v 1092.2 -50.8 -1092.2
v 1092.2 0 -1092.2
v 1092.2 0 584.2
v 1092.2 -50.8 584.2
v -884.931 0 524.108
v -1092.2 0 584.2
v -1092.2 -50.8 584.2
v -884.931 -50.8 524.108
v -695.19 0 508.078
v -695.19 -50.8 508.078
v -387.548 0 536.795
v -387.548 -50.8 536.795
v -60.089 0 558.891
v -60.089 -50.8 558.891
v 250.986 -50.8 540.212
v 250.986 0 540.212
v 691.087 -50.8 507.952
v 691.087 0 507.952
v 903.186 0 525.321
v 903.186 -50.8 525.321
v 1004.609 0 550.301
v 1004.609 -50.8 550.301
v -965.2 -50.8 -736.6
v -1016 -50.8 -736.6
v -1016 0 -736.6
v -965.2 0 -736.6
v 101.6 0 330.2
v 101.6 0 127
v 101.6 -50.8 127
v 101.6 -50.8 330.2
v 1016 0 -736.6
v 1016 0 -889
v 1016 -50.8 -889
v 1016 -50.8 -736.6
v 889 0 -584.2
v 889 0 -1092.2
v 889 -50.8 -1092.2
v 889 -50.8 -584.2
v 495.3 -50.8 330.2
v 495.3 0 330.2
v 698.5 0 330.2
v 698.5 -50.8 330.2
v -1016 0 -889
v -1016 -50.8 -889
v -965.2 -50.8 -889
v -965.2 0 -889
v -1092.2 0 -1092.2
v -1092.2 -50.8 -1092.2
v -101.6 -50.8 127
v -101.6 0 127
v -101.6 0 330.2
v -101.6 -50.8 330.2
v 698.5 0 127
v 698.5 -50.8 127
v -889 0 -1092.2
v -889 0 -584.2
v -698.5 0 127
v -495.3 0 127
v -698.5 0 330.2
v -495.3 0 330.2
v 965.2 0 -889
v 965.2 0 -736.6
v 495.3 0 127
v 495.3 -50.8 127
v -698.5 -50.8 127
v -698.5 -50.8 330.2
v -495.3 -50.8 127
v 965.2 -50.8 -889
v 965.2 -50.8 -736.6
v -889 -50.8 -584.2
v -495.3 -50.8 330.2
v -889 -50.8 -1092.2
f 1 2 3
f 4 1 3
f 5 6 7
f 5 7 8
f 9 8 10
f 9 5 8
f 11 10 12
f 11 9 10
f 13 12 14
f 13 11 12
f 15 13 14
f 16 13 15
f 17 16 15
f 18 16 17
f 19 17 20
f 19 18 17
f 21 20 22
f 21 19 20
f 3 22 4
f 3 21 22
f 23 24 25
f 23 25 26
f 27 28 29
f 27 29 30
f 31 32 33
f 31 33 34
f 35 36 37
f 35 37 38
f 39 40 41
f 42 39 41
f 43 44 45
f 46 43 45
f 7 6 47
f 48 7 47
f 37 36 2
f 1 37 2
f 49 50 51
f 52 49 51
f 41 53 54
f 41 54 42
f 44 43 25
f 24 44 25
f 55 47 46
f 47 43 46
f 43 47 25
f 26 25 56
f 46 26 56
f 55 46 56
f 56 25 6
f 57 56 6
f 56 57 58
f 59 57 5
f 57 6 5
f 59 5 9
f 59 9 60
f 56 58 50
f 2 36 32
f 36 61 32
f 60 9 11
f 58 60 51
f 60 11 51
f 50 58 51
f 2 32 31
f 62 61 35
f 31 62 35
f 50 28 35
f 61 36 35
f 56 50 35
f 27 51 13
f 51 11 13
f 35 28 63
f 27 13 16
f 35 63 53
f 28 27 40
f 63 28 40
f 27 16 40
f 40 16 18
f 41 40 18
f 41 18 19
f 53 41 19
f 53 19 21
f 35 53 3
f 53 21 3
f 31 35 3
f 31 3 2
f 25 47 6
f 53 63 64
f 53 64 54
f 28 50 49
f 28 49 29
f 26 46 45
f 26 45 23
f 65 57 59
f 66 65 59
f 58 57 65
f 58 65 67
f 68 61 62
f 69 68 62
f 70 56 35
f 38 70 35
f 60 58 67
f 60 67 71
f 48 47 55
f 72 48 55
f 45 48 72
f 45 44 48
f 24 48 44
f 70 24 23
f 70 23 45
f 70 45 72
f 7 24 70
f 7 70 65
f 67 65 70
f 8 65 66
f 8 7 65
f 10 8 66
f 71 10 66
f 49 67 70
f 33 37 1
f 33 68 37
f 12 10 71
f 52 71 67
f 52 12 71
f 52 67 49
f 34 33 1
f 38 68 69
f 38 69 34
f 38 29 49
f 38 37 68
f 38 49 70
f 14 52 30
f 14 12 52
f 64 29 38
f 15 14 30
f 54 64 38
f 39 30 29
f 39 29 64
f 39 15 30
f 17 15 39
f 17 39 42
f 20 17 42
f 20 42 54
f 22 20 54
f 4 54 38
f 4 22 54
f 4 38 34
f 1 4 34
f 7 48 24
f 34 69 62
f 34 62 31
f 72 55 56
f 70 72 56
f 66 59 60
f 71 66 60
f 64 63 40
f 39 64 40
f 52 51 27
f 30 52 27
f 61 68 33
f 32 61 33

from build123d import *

# Parameters (mm, degrees)
F0_W     = 203.2
F0_H     = 508
F0_W_2   = 50.8
F0_H_2   = 152.4
F0_H_3   = 203.2
F1_DEPTH = 50.8


with BuildPart() as f1:
    # F0 (on Front) → F1 (new body)
    with BuildSketch(Plane.XZ):
        with Locations((-990.6, -838.2)):
            Rectangle(F0_W, F0_H)
        with Locations((-990.6, -812.8)):
            Rectangle(F0_W_2, F0_H_2, mode=Mode.SUBTRACT)
        with Locations((990.6, -838.2)):
            Rectangle(F0_W, F0_H)
        with Locations((990.6, -812.8)):
            Rectangle(F0_W_2, F0_H_2, mode=Mode.SUBTRACT)
        with BuildLine():
            add(Edge.make_bspline(
                [(-1092.2, 584.2), (-980.9341244819, 539.9121567226), (-692.3205033902, 468.9691085106), (-103.7885392301, 611.398573737), (693.6453585688, 466.7257971096), (995.3503534145, 539.0780902978), (1092.2, 584.2)],
                knots=[0, 0, 0, 0, 0.2126532774, 0.4794774151, 0.7873467226, 1, 1, 1, 1], degree=3))
            Line((-1092.2, 584.2), (-1092.2, -584.2))
            Line((-1092.2, -584.2), (-889, -584.2))
            Line((-889, -584.2), (889, -584.2))
            Line((889, -584.2), (1092.2, -584.2))
            Line((1092.2, -584.2), (1092.2, 584.2))
        make_face()
        with Locations((-596.9, 228.6)):
            Rectangle(F0_W, F0_H_3, mode=Mode.SUBTRACT)
        with Locations((0, 228.6)):
            Rectangle(F0_W, F0_H_3, mode=Mode.SUBTRACT)
        with Locations((596.9, 228.6)):
            Rectangle(F0_W, F0_H_3, mode=Mode.SUBTRACT)
    extrude(amount=F1_DEPTH)


solid = f1.part
